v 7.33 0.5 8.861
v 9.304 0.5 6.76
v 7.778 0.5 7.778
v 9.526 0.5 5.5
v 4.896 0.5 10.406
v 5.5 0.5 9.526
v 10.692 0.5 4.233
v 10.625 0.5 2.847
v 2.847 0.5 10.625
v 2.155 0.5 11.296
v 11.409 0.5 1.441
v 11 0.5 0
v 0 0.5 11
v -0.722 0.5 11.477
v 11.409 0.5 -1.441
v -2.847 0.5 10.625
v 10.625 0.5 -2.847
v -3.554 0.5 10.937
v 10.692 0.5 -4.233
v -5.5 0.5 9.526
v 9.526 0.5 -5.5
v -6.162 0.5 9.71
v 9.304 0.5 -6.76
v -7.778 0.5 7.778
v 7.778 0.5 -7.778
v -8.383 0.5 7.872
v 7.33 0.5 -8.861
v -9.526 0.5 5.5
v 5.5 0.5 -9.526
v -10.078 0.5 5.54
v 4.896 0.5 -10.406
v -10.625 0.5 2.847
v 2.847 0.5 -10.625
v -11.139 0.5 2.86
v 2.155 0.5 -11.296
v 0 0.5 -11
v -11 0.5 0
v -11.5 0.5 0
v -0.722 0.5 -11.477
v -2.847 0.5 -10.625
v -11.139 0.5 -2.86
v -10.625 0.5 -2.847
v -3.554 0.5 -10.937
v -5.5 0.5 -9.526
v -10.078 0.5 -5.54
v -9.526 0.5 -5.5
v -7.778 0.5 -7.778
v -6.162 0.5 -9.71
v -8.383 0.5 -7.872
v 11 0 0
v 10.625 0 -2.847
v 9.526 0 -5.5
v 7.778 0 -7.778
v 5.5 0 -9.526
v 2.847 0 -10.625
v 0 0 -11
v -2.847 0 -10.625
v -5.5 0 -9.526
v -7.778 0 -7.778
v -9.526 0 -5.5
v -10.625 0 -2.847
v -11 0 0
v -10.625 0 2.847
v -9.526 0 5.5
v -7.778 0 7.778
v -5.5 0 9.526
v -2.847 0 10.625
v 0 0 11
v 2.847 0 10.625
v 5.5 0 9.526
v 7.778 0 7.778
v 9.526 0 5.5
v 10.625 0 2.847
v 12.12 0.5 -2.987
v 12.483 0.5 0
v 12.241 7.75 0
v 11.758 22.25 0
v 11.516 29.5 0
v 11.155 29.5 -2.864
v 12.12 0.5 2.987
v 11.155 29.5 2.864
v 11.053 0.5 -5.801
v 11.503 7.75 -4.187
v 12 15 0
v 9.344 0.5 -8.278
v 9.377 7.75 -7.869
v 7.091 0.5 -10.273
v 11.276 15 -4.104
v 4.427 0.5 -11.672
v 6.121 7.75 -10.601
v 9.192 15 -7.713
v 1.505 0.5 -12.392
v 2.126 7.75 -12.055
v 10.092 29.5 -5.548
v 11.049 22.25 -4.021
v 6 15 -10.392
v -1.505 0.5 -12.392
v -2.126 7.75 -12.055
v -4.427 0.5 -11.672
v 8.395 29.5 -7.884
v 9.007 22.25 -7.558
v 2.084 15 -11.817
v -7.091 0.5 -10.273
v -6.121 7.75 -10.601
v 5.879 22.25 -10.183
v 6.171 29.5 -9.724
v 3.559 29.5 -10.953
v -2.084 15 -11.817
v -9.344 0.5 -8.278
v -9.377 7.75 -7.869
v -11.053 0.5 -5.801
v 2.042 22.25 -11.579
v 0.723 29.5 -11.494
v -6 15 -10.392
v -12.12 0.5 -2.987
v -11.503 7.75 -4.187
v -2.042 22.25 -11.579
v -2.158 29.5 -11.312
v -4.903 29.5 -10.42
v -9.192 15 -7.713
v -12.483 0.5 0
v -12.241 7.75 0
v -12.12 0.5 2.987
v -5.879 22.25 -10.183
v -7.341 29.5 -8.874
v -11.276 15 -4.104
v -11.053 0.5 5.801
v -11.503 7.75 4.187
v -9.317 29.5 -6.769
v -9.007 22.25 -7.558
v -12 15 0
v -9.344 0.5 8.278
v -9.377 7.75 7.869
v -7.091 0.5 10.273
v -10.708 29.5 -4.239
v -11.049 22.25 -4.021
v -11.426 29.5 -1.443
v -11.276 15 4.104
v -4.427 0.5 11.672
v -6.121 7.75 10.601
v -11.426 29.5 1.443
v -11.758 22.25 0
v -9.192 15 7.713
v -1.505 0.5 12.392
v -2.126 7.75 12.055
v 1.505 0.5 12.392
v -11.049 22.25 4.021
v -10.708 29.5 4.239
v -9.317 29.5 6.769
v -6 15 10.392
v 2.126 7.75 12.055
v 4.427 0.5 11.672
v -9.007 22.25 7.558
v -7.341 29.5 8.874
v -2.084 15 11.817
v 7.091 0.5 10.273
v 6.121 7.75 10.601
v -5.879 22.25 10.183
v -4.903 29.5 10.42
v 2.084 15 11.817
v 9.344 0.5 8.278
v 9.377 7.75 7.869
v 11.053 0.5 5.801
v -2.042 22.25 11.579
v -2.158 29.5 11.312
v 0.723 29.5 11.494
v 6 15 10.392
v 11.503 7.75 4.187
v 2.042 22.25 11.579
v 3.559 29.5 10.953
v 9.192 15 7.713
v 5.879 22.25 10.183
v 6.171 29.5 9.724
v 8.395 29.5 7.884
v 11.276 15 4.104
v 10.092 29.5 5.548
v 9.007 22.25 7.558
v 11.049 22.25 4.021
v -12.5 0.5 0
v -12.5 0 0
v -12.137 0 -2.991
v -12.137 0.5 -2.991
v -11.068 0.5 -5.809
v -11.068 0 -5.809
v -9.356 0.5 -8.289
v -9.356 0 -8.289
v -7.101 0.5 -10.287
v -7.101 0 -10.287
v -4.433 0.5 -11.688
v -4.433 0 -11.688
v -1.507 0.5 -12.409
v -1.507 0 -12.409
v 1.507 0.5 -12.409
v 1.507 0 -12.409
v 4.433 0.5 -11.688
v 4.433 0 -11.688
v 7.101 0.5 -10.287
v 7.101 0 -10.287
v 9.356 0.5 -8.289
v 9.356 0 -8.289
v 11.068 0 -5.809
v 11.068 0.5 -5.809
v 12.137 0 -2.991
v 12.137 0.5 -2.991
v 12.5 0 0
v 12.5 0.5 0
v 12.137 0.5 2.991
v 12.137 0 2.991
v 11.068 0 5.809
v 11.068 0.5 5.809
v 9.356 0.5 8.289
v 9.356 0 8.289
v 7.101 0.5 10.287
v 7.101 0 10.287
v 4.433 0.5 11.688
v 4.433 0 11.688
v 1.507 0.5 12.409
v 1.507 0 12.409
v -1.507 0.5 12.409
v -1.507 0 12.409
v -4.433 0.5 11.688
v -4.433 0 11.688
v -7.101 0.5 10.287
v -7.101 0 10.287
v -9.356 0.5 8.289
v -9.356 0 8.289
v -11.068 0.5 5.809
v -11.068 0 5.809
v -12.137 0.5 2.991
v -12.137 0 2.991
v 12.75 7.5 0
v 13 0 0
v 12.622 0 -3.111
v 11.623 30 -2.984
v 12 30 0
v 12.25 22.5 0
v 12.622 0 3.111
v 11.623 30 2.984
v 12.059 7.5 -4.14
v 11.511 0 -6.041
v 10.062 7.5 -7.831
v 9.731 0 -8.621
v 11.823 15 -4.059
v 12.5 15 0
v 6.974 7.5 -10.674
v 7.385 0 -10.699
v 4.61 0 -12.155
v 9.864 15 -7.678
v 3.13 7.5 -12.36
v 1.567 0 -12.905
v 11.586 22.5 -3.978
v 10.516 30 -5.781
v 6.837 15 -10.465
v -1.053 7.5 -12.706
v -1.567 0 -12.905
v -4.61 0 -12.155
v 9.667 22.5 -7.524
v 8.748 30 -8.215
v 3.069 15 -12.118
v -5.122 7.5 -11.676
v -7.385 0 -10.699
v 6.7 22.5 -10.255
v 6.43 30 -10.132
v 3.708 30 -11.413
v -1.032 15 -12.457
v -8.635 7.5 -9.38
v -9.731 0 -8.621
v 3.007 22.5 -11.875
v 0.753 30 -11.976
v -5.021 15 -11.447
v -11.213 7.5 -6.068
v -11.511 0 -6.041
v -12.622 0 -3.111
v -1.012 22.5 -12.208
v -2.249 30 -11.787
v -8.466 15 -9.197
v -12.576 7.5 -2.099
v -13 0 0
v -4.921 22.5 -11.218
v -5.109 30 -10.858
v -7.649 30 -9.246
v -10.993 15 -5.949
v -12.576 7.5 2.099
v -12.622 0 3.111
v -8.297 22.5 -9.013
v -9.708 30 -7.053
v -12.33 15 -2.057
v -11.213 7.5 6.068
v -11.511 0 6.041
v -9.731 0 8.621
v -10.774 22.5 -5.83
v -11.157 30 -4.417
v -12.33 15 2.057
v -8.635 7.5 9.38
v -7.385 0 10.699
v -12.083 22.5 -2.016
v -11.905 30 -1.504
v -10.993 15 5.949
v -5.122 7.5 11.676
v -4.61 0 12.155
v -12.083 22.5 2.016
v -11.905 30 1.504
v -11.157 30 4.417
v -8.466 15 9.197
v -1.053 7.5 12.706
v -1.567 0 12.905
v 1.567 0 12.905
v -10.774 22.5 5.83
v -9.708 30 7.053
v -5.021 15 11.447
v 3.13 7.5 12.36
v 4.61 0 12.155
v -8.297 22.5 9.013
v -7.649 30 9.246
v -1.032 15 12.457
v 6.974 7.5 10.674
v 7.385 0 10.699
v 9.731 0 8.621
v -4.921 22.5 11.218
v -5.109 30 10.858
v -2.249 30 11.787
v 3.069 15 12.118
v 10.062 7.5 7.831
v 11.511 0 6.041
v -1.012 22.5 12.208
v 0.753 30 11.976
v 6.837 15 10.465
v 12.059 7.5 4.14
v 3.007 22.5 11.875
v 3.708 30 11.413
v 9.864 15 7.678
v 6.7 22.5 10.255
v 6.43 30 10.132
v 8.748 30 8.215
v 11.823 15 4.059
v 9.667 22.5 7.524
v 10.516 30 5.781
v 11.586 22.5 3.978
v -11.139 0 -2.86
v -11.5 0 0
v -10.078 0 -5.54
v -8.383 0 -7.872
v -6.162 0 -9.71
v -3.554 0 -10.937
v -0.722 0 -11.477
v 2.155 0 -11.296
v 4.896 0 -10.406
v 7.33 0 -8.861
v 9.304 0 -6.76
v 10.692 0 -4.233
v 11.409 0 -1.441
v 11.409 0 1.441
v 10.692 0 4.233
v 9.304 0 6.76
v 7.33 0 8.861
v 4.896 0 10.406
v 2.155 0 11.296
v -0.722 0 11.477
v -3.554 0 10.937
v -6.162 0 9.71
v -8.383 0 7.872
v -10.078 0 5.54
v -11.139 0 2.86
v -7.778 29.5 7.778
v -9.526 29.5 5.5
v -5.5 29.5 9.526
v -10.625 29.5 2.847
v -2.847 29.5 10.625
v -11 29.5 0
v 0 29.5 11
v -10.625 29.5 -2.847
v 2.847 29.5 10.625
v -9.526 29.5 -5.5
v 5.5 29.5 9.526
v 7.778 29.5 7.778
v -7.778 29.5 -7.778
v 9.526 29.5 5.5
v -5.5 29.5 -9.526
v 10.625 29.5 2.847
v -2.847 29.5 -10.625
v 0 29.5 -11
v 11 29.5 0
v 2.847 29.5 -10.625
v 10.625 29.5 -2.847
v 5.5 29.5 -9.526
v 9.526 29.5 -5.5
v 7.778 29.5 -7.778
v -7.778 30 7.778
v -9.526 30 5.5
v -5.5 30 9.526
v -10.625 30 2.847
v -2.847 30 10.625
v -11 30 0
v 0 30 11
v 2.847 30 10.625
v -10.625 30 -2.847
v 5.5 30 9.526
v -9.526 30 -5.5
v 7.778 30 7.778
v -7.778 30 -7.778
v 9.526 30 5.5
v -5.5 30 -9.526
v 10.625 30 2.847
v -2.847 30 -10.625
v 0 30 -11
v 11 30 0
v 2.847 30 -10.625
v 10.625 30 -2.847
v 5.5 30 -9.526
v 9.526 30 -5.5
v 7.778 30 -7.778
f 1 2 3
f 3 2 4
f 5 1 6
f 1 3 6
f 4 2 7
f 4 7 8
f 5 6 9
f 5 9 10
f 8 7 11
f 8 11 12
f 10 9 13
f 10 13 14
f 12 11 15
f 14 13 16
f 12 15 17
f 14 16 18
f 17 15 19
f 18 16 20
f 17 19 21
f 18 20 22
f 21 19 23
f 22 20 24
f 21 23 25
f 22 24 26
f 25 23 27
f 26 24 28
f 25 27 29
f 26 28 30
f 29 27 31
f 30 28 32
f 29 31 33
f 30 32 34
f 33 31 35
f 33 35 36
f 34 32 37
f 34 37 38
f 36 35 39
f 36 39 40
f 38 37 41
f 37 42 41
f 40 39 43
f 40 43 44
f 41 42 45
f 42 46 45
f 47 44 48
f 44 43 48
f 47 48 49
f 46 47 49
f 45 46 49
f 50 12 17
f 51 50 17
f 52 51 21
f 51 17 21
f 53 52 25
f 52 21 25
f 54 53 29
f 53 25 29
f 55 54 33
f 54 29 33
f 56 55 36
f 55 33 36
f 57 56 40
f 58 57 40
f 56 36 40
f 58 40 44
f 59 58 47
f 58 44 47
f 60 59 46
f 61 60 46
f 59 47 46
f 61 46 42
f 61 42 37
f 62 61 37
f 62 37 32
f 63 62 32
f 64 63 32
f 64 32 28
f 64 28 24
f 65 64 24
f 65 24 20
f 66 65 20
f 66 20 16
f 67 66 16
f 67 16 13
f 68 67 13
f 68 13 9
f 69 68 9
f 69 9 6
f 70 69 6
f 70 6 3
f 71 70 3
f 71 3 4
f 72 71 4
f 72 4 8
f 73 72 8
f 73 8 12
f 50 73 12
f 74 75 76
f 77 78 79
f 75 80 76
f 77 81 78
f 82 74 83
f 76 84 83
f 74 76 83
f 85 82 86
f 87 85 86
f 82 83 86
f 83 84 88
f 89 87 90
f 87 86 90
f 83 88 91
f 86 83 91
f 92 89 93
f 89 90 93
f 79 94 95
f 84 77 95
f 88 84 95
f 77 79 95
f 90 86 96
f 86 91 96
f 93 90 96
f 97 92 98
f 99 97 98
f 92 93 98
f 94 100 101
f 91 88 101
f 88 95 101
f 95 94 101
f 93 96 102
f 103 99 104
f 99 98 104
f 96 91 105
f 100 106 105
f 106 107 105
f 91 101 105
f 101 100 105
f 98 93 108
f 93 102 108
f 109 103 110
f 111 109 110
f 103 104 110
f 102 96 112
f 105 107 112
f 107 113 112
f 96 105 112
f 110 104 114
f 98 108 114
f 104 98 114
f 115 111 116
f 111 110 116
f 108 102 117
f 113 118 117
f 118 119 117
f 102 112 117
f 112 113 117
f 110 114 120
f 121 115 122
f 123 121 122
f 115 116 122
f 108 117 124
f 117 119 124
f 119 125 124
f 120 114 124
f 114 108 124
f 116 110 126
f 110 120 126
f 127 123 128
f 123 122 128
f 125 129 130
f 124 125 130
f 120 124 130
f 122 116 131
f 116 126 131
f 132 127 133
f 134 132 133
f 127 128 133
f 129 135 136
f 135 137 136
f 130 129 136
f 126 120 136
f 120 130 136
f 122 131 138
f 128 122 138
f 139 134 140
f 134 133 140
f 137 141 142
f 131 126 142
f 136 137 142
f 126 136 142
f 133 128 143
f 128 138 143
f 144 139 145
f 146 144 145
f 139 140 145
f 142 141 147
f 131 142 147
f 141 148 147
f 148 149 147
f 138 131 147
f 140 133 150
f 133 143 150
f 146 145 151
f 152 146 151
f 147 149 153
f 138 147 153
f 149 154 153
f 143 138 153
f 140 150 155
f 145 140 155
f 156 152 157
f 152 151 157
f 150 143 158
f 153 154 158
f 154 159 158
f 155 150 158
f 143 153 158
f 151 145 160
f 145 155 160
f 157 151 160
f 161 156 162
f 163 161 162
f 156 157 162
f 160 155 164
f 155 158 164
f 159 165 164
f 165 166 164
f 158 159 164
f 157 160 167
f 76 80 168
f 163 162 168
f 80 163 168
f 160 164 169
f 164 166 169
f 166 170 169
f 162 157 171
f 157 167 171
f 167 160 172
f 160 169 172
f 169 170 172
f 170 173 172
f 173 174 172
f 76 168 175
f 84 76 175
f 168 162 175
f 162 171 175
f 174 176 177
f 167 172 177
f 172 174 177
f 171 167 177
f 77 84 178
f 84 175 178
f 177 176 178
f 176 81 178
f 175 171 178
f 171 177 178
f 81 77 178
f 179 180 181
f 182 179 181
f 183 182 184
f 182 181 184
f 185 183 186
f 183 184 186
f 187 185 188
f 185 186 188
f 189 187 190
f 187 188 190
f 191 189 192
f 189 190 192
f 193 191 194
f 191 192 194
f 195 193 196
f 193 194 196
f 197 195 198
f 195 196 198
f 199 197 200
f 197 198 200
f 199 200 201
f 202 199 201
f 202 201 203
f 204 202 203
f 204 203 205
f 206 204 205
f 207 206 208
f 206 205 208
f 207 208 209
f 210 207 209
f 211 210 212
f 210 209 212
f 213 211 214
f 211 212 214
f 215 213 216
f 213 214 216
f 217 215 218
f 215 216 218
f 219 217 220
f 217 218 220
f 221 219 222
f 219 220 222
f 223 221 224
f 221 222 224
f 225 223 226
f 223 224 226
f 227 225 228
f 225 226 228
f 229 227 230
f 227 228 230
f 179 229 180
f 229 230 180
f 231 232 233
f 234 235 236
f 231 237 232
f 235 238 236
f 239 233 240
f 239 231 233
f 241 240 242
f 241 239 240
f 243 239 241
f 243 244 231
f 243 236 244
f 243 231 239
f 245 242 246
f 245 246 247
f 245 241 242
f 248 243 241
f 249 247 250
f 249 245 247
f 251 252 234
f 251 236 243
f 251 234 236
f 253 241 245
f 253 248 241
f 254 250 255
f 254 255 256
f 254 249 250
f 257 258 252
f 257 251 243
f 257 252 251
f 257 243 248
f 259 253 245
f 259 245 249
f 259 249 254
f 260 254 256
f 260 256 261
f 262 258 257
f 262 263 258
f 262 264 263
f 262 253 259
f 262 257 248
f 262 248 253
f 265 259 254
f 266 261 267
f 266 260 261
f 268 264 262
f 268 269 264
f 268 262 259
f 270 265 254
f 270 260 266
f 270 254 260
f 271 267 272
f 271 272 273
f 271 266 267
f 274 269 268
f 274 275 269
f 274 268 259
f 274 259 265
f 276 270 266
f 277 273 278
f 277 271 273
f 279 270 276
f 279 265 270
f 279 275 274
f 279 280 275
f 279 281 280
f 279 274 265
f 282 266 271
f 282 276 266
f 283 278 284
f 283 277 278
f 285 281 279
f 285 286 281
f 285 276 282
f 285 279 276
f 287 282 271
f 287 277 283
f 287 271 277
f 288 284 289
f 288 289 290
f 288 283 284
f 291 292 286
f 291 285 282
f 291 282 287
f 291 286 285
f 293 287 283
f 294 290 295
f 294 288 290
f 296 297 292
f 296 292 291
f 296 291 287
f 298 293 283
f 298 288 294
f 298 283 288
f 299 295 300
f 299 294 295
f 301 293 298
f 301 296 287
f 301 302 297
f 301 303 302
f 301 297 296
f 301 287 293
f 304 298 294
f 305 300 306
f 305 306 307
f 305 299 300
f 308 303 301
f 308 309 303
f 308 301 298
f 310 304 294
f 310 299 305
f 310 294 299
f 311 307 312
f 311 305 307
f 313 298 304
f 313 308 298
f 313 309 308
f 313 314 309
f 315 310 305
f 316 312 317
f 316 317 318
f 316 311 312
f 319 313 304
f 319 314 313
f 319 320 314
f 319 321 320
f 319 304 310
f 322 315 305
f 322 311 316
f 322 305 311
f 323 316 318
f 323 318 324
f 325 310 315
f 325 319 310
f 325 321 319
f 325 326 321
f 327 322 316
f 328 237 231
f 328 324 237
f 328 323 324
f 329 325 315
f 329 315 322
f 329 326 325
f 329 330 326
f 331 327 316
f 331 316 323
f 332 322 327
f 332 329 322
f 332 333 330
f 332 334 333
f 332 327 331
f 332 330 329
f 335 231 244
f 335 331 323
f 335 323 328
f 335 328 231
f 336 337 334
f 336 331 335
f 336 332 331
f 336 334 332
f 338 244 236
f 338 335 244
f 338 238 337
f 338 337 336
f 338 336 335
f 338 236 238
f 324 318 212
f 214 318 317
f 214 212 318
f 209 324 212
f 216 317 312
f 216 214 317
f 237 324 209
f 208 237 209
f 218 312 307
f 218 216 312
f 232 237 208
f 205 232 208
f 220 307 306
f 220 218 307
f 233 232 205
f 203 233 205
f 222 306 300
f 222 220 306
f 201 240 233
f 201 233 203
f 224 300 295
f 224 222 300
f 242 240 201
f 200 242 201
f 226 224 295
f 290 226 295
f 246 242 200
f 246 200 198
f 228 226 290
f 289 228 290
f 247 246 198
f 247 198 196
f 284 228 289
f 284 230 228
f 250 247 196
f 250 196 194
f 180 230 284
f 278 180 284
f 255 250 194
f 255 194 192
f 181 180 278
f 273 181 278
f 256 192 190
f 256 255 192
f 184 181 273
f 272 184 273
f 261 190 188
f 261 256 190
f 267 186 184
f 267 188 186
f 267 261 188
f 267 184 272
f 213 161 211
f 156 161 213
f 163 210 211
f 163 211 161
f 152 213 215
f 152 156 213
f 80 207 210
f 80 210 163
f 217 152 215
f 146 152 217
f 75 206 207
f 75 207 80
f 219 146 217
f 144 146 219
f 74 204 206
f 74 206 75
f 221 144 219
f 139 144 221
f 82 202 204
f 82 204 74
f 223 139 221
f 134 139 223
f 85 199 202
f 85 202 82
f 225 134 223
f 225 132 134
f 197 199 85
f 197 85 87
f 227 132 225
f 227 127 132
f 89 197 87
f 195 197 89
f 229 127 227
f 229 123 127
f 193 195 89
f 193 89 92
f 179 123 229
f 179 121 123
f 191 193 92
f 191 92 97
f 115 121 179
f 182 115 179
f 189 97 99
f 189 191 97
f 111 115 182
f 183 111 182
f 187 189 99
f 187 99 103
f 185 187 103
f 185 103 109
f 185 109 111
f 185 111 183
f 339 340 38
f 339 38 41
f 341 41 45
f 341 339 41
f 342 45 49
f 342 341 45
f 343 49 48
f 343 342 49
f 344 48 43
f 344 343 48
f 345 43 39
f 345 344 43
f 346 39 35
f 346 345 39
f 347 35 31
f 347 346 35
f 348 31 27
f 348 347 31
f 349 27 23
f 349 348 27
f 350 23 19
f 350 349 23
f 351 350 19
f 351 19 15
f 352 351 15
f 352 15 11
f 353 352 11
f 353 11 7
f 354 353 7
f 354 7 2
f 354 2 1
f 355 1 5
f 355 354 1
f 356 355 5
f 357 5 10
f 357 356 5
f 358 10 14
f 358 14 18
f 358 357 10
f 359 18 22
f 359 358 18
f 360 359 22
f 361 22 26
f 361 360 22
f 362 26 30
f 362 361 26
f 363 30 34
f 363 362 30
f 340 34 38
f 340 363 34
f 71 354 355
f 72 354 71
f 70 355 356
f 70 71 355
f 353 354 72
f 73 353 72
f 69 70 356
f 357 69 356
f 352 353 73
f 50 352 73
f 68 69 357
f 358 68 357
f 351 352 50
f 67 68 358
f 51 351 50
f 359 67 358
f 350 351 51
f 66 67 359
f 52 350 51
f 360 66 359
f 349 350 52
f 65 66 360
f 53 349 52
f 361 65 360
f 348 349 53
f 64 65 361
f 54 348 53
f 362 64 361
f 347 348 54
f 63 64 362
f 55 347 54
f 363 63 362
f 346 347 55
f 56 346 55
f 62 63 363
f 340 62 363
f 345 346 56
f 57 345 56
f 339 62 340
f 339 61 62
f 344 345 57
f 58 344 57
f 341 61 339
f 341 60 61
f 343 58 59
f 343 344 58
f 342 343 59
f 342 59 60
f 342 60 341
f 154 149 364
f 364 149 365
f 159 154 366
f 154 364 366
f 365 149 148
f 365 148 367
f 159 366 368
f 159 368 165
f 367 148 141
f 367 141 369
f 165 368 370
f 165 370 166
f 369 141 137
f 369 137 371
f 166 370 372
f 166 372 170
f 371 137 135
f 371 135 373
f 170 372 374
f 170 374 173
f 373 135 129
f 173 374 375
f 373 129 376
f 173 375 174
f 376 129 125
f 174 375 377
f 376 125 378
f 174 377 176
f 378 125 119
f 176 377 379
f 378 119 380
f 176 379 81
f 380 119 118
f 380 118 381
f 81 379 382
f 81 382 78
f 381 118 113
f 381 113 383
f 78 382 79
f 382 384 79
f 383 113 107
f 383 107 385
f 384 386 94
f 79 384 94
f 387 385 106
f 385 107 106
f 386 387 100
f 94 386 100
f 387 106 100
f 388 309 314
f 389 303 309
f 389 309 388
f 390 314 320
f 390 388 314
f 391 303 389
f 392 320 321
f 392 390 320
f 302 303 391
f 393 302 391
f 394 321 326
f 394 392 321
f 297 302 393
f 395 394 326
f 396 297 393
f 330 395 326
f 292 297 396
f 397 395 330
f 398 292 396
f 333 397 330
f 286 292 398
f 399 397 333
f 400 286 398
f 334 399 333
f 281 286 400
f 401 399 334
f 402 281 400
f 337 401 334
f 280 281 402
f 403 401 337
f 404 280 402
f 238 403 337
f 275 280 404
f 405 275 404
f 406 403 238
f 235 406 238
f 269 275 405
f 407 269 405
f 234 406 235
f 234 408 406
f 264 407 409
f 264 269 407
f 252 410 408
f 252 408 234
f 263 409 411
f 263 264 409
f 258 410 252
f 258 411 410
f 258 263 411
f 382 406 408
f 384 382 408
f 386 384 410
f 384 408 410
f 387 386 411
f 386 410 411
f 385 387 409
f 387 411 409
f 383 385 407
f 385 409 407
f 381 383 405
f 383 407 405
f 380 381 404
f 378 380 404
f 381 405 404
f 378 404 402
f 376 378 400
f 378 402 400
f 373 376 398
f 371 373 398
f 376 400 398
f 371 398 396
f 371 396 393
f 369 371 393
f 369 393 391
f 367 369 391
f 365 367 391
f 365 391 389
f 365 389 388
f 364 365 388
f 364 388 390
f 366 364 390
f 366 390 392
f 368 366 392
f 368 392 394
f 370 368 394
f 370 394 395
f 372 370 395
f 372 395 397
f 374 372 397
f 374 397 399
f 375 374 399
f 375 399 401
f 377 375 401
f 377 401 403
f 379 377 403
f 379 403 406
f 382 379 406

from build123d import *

# Parameters (mm, degrees)
SKETCH6_R          = 11
CUT_EXTRUDE1_DEPTH = 30
SKETCH8_R          = 12.5
SKETCH8_R_2        = 11.5
CUT_EXTRUDE3_DEPTH = 0.5


with BuildPart() as part:
    # Sketch3 → Revolve1 (revolve)
    with BuildSketch(Plane.XY):
        Polygon((0, 0), (13, 0), (12, 30), (0, 30), align=None)
    revolve(axis=Axis((0, 0, 0), (0, 1, 0)))

    # Sketch6 → Cut-Extrude1 (cut)
    with BuildSketch(Plane(origin=(0, 30, 0), x_dir=(1, 0, 0), z_dir=(0, 1, 0))):
        Circle(SKETCH6_R)
    extrude(amount=-CUT_EXTRUDE1_DEPTH, mode=Mode.SUBTRACT)

    # Sketch7 → Cut-Revolve1 (revolve, cut)
    with BuildSketch(Plane.XY):
        Polygon((8.985599586, 29.5), (9.627507592, 0.5), (12.483055633, 0.5), (11.516388966, 29.5), align=None)
    revolve(axis=Axis((0, 0, 0), (0, 1, 0)), mode=Mode.SUBTRACT)

    # Sketch8 → Cut-Extrude3 (cut)
    with BuildSketch(Plane(origin=(0, 0, 0), x_dir=(-1, 0, 0), z_dir=(0, -1, 0))):
        Circle(SKETCH8_R)
        Circle(SKETCH8_R_2, mode=Mode.SUBTRACT)
    extrude(amount=-CUT_EXTRUDE3_DEPTH, mode=Mode.SUBTRACT)


solid = part.part
